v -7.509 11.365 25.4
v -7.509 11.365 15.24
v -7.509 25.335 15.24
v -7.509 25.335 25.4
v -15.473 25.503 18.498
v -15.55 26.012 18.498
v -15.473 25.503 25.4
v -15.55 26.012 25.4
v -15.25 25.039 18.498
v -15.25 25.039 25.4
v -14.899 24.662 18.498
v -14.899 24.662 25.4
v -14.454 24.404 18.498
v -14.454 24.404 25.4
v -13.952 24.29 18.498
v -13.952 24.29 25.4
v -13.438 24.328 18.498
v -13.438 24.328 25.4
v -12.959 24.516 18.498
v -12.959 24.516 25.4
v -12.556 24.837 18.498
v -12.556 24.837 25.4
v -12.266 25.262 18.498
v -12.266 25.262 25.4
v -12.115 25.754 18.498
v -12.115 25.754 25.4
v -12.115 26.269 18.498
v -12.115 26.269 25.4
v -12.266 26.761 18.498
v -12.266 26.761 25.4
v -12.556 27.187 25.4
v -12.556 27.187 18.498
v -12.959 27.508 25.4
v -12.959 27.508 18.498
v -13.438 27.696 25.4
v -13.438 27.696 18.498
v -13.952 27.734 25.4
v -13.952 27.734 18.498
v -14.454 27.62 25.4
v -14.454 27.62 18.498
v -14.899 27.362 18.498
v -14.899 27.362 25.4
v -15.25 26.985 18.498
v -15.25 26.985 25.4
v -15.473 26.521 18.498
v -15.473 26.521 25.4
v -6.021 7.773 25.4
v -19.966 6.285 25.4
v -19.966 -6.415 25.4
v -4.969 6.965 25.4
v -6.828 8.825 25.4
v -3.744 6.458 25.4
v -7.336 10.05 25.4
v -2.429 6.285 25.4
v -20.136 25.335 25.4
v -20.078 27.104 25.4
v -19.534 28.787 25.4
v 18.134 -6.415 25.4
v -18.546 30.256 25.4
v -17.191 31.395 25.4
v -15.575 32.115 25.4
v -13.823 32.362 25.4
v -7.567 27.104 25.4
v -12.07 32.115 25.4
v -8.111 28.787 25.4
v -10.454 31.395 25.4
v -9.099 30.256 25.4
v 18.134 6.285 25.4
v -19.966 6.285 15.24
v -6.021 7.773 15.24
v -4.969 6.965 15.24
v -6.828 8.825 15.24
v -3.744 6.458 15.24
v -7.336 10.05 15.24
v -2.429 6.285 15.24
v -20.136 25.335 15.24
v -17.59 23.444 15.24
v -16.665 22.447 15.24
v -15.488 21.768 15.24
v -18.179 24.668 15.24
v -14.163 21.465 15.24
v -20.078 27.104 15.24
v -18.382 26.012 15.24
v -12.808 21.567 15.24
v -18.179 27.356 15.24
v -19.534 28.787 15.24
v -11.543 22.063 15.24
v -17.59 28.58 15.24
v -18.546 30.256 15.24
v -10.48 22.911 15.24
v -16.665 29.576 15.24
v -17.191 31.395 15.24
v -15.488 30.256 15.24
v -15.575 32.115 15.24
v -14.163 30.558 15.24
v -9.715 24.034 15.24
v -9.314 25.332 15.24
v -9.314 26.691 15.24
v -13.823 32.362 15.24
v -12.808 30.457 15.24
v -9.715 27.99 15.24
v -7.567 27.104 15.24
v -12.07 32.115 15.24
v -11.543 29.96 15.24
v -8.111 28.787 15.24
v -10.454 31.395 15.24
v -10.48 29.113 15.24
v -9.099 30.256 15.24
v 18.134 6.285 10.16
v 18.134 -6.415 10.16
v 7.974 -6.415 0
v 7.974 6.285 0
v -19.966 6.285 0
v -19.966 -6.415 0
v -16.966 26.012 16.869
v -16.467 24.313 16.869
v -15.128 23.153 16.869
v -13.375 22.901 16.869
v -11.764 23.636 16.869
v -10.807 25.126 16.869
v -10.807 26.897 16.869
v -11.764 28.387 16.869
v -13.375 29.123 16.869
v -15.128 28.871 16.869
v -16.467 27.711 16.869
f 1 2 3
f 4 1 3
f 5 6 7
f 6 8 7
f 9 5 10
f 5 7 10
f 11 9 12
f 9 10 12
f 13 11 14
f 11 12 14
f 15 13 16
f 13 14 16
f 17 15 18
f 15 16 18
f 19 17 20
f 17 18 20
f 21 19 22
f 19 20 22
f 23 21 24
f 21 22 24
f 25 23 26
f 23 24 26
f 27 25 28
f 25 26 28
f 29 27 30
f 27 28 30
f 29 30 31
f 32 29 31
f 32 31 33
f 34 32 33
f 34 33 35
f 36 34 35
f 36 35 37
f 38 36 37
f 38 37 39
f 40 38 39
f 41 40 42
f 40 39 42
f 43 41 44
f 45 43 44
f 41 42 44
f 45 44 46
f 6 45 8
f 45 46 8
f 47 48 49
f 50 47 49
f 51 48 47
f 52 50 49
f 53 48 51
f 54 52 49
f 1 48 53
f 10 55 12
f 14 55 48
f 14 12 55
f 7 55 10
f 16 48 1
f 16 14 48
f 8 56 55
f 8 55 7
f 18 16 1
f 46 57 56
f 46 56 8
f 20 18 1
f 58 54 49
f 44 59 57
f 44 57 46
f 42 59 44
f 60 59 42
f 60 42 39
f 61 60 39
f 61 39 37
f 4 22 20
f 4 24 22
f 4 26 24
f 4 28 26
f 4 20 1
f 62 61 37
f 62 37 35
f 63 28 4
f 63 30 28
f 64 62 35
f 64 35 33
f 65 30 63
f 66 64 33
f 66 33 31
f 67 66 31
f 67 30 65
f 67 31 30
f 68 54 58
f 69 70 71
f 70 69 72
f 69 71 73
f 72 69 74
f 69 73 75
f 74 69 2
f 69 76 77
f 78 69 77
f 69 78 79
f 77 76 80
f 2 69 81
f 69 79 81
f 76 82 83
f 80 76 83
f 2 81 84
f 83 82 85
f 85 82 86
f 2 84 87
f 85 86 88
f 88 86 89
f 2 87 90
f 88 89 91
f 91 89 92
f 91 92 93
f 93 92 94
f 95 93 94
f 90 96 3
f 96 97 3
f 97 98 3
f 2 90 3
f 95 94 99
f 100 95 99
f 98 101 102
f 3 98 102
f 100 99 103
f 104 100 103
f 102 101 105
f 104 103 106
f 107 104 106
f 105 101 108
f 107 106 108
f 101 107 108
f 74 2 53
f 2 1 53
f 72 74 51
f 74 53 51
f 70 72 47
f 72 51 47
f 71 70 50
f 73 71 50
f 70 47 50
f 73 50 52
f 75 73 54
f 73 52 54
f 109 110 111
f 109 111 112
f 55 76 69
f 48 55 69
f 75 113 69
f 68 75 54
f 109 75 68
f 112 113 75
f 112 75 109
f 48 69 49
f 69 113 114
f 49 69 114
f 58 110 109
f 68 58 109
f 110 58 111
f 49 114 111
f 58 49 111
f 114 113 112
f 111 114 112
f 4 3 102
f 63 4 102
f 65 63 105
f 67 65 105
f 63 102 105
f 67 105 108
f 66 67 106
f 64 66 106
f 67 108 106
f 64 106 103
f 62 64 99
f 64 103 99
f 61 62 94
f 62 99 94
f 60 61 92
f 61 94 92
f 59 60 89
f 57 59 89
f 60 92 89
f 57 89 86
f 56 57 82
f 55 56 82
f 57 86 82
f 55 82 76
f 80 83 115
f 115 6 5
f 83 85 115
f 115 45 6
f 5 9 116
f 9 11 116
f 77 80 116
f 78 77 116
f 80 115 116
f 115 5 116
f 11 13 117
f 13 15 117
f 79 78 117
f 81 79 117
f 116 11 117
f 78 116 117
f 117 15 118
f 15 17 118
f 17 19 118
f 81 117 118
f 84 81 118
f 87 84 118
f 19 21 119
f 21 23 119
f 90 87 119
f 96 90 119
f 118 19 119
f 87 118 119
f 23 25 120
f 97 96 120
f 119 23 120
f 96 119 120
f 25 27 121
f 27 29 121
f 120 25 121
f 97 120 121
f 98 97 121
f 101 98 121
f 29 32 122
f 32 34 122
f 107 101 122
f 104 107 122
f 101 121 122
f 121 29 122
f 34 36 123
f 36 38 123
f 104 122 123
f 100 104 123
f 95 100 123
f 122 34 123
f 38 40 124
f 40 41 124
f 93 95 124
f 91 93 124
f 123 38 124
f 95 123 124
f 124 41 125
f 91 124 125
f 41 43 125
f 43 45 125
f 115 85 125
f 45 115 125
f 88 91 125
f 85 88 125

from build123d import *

# Parameters (mm, degrees)
F1_DEPTH       = 25.4
F2_DEPTH       = 15.24
F3_D           = 3.4544
F3_START       = 15.24
F3_CSINK_D     = 9.1186
F3_CSINK_ANGLE = 82
F4_R           = 5.08
F5_SIZE        = 10.16


with BuildPart() as f1:
    # F0 (on Top) → F1 (new body)
    with BuildSketch(Plane.XY):
        Polygon((-7.5087412455, 6.2847674176), (-19.9657089517, 6.2847674176), (-19.9657089517, -6.4152325824), (18.1342910483, -6.4152325824), (18.1342910483, 6.2847674176), align=None)
        with BuildLine():
            Line((-20.1363313266, 25.3347674176), (-19.9657089517, 6.2847674176))
            Line((-19.9657089517, 6.2847674176), (-7.5087412455, 6.2847674176))
            Line((-7.5087412455, 6.2847674176), (-7.5087412455, 25.3347674176))
            ThreePointArc((-7.5087412455, 25.3347674176), (-13.8225362861, 32.3618879282), (-20.1363313266, 25.3347674176))
        make_face()
    extrude(amount=F1_DEPTH)

    # F0 (on Top) → F2 (cut)
    with BuildSketch(Plane.XY):
        with BuildLine():
            Line((-20.1363313266, 25.3347674176), (-19.9657089517, 6.2847674176))
            Line((-19.9657089517, 6.2847674176), (-7.5087412455, 6.2847674176))
            Line((-7.5087412455, 6.2847674176), (-7.5087412455, 25.3347674176))
            ThreePointArc((-7.5087412455, 25.3347674176), (-13.8225362861, 32.3618879282), (-20.1363313266, 25.3347674176))
        make_face()
    extrude(amount=F2_DEPTH, mode=Mode.SUBTRACT)

    # F3 (through all)
    # its depths count from where the whole tool has entered the part; down to there all is cleared
    with Locations(Plane(origin=(0, 0, 0), x_dir=(1, 0, 0), z_dir=(0, 0, -1)).offset(-F3_START)):
        with Locations((-13.8225362861, -26.0118879282)):
            CounterSinkHole(F3_D / 2, F3_CSINK_D / 2, counter_sink_angle=F3_CSINK_ANGLE)

    # F4
    f4_edges = [f1.edges().sort_by_distance(p)[0] for p in [
        (-7.508741, 6.284767, 20.32),
    ]]
    fillet(f4_edges, radius=F4_R)

    # F5
    f5_edges = [f1.edges().sort_by_distance(p)[0] for p in [
        (18.134291, -0.065233, 0),
    ]]
    chamfer(f5_edges, length=F5_SIZE)


solid = f1.part
